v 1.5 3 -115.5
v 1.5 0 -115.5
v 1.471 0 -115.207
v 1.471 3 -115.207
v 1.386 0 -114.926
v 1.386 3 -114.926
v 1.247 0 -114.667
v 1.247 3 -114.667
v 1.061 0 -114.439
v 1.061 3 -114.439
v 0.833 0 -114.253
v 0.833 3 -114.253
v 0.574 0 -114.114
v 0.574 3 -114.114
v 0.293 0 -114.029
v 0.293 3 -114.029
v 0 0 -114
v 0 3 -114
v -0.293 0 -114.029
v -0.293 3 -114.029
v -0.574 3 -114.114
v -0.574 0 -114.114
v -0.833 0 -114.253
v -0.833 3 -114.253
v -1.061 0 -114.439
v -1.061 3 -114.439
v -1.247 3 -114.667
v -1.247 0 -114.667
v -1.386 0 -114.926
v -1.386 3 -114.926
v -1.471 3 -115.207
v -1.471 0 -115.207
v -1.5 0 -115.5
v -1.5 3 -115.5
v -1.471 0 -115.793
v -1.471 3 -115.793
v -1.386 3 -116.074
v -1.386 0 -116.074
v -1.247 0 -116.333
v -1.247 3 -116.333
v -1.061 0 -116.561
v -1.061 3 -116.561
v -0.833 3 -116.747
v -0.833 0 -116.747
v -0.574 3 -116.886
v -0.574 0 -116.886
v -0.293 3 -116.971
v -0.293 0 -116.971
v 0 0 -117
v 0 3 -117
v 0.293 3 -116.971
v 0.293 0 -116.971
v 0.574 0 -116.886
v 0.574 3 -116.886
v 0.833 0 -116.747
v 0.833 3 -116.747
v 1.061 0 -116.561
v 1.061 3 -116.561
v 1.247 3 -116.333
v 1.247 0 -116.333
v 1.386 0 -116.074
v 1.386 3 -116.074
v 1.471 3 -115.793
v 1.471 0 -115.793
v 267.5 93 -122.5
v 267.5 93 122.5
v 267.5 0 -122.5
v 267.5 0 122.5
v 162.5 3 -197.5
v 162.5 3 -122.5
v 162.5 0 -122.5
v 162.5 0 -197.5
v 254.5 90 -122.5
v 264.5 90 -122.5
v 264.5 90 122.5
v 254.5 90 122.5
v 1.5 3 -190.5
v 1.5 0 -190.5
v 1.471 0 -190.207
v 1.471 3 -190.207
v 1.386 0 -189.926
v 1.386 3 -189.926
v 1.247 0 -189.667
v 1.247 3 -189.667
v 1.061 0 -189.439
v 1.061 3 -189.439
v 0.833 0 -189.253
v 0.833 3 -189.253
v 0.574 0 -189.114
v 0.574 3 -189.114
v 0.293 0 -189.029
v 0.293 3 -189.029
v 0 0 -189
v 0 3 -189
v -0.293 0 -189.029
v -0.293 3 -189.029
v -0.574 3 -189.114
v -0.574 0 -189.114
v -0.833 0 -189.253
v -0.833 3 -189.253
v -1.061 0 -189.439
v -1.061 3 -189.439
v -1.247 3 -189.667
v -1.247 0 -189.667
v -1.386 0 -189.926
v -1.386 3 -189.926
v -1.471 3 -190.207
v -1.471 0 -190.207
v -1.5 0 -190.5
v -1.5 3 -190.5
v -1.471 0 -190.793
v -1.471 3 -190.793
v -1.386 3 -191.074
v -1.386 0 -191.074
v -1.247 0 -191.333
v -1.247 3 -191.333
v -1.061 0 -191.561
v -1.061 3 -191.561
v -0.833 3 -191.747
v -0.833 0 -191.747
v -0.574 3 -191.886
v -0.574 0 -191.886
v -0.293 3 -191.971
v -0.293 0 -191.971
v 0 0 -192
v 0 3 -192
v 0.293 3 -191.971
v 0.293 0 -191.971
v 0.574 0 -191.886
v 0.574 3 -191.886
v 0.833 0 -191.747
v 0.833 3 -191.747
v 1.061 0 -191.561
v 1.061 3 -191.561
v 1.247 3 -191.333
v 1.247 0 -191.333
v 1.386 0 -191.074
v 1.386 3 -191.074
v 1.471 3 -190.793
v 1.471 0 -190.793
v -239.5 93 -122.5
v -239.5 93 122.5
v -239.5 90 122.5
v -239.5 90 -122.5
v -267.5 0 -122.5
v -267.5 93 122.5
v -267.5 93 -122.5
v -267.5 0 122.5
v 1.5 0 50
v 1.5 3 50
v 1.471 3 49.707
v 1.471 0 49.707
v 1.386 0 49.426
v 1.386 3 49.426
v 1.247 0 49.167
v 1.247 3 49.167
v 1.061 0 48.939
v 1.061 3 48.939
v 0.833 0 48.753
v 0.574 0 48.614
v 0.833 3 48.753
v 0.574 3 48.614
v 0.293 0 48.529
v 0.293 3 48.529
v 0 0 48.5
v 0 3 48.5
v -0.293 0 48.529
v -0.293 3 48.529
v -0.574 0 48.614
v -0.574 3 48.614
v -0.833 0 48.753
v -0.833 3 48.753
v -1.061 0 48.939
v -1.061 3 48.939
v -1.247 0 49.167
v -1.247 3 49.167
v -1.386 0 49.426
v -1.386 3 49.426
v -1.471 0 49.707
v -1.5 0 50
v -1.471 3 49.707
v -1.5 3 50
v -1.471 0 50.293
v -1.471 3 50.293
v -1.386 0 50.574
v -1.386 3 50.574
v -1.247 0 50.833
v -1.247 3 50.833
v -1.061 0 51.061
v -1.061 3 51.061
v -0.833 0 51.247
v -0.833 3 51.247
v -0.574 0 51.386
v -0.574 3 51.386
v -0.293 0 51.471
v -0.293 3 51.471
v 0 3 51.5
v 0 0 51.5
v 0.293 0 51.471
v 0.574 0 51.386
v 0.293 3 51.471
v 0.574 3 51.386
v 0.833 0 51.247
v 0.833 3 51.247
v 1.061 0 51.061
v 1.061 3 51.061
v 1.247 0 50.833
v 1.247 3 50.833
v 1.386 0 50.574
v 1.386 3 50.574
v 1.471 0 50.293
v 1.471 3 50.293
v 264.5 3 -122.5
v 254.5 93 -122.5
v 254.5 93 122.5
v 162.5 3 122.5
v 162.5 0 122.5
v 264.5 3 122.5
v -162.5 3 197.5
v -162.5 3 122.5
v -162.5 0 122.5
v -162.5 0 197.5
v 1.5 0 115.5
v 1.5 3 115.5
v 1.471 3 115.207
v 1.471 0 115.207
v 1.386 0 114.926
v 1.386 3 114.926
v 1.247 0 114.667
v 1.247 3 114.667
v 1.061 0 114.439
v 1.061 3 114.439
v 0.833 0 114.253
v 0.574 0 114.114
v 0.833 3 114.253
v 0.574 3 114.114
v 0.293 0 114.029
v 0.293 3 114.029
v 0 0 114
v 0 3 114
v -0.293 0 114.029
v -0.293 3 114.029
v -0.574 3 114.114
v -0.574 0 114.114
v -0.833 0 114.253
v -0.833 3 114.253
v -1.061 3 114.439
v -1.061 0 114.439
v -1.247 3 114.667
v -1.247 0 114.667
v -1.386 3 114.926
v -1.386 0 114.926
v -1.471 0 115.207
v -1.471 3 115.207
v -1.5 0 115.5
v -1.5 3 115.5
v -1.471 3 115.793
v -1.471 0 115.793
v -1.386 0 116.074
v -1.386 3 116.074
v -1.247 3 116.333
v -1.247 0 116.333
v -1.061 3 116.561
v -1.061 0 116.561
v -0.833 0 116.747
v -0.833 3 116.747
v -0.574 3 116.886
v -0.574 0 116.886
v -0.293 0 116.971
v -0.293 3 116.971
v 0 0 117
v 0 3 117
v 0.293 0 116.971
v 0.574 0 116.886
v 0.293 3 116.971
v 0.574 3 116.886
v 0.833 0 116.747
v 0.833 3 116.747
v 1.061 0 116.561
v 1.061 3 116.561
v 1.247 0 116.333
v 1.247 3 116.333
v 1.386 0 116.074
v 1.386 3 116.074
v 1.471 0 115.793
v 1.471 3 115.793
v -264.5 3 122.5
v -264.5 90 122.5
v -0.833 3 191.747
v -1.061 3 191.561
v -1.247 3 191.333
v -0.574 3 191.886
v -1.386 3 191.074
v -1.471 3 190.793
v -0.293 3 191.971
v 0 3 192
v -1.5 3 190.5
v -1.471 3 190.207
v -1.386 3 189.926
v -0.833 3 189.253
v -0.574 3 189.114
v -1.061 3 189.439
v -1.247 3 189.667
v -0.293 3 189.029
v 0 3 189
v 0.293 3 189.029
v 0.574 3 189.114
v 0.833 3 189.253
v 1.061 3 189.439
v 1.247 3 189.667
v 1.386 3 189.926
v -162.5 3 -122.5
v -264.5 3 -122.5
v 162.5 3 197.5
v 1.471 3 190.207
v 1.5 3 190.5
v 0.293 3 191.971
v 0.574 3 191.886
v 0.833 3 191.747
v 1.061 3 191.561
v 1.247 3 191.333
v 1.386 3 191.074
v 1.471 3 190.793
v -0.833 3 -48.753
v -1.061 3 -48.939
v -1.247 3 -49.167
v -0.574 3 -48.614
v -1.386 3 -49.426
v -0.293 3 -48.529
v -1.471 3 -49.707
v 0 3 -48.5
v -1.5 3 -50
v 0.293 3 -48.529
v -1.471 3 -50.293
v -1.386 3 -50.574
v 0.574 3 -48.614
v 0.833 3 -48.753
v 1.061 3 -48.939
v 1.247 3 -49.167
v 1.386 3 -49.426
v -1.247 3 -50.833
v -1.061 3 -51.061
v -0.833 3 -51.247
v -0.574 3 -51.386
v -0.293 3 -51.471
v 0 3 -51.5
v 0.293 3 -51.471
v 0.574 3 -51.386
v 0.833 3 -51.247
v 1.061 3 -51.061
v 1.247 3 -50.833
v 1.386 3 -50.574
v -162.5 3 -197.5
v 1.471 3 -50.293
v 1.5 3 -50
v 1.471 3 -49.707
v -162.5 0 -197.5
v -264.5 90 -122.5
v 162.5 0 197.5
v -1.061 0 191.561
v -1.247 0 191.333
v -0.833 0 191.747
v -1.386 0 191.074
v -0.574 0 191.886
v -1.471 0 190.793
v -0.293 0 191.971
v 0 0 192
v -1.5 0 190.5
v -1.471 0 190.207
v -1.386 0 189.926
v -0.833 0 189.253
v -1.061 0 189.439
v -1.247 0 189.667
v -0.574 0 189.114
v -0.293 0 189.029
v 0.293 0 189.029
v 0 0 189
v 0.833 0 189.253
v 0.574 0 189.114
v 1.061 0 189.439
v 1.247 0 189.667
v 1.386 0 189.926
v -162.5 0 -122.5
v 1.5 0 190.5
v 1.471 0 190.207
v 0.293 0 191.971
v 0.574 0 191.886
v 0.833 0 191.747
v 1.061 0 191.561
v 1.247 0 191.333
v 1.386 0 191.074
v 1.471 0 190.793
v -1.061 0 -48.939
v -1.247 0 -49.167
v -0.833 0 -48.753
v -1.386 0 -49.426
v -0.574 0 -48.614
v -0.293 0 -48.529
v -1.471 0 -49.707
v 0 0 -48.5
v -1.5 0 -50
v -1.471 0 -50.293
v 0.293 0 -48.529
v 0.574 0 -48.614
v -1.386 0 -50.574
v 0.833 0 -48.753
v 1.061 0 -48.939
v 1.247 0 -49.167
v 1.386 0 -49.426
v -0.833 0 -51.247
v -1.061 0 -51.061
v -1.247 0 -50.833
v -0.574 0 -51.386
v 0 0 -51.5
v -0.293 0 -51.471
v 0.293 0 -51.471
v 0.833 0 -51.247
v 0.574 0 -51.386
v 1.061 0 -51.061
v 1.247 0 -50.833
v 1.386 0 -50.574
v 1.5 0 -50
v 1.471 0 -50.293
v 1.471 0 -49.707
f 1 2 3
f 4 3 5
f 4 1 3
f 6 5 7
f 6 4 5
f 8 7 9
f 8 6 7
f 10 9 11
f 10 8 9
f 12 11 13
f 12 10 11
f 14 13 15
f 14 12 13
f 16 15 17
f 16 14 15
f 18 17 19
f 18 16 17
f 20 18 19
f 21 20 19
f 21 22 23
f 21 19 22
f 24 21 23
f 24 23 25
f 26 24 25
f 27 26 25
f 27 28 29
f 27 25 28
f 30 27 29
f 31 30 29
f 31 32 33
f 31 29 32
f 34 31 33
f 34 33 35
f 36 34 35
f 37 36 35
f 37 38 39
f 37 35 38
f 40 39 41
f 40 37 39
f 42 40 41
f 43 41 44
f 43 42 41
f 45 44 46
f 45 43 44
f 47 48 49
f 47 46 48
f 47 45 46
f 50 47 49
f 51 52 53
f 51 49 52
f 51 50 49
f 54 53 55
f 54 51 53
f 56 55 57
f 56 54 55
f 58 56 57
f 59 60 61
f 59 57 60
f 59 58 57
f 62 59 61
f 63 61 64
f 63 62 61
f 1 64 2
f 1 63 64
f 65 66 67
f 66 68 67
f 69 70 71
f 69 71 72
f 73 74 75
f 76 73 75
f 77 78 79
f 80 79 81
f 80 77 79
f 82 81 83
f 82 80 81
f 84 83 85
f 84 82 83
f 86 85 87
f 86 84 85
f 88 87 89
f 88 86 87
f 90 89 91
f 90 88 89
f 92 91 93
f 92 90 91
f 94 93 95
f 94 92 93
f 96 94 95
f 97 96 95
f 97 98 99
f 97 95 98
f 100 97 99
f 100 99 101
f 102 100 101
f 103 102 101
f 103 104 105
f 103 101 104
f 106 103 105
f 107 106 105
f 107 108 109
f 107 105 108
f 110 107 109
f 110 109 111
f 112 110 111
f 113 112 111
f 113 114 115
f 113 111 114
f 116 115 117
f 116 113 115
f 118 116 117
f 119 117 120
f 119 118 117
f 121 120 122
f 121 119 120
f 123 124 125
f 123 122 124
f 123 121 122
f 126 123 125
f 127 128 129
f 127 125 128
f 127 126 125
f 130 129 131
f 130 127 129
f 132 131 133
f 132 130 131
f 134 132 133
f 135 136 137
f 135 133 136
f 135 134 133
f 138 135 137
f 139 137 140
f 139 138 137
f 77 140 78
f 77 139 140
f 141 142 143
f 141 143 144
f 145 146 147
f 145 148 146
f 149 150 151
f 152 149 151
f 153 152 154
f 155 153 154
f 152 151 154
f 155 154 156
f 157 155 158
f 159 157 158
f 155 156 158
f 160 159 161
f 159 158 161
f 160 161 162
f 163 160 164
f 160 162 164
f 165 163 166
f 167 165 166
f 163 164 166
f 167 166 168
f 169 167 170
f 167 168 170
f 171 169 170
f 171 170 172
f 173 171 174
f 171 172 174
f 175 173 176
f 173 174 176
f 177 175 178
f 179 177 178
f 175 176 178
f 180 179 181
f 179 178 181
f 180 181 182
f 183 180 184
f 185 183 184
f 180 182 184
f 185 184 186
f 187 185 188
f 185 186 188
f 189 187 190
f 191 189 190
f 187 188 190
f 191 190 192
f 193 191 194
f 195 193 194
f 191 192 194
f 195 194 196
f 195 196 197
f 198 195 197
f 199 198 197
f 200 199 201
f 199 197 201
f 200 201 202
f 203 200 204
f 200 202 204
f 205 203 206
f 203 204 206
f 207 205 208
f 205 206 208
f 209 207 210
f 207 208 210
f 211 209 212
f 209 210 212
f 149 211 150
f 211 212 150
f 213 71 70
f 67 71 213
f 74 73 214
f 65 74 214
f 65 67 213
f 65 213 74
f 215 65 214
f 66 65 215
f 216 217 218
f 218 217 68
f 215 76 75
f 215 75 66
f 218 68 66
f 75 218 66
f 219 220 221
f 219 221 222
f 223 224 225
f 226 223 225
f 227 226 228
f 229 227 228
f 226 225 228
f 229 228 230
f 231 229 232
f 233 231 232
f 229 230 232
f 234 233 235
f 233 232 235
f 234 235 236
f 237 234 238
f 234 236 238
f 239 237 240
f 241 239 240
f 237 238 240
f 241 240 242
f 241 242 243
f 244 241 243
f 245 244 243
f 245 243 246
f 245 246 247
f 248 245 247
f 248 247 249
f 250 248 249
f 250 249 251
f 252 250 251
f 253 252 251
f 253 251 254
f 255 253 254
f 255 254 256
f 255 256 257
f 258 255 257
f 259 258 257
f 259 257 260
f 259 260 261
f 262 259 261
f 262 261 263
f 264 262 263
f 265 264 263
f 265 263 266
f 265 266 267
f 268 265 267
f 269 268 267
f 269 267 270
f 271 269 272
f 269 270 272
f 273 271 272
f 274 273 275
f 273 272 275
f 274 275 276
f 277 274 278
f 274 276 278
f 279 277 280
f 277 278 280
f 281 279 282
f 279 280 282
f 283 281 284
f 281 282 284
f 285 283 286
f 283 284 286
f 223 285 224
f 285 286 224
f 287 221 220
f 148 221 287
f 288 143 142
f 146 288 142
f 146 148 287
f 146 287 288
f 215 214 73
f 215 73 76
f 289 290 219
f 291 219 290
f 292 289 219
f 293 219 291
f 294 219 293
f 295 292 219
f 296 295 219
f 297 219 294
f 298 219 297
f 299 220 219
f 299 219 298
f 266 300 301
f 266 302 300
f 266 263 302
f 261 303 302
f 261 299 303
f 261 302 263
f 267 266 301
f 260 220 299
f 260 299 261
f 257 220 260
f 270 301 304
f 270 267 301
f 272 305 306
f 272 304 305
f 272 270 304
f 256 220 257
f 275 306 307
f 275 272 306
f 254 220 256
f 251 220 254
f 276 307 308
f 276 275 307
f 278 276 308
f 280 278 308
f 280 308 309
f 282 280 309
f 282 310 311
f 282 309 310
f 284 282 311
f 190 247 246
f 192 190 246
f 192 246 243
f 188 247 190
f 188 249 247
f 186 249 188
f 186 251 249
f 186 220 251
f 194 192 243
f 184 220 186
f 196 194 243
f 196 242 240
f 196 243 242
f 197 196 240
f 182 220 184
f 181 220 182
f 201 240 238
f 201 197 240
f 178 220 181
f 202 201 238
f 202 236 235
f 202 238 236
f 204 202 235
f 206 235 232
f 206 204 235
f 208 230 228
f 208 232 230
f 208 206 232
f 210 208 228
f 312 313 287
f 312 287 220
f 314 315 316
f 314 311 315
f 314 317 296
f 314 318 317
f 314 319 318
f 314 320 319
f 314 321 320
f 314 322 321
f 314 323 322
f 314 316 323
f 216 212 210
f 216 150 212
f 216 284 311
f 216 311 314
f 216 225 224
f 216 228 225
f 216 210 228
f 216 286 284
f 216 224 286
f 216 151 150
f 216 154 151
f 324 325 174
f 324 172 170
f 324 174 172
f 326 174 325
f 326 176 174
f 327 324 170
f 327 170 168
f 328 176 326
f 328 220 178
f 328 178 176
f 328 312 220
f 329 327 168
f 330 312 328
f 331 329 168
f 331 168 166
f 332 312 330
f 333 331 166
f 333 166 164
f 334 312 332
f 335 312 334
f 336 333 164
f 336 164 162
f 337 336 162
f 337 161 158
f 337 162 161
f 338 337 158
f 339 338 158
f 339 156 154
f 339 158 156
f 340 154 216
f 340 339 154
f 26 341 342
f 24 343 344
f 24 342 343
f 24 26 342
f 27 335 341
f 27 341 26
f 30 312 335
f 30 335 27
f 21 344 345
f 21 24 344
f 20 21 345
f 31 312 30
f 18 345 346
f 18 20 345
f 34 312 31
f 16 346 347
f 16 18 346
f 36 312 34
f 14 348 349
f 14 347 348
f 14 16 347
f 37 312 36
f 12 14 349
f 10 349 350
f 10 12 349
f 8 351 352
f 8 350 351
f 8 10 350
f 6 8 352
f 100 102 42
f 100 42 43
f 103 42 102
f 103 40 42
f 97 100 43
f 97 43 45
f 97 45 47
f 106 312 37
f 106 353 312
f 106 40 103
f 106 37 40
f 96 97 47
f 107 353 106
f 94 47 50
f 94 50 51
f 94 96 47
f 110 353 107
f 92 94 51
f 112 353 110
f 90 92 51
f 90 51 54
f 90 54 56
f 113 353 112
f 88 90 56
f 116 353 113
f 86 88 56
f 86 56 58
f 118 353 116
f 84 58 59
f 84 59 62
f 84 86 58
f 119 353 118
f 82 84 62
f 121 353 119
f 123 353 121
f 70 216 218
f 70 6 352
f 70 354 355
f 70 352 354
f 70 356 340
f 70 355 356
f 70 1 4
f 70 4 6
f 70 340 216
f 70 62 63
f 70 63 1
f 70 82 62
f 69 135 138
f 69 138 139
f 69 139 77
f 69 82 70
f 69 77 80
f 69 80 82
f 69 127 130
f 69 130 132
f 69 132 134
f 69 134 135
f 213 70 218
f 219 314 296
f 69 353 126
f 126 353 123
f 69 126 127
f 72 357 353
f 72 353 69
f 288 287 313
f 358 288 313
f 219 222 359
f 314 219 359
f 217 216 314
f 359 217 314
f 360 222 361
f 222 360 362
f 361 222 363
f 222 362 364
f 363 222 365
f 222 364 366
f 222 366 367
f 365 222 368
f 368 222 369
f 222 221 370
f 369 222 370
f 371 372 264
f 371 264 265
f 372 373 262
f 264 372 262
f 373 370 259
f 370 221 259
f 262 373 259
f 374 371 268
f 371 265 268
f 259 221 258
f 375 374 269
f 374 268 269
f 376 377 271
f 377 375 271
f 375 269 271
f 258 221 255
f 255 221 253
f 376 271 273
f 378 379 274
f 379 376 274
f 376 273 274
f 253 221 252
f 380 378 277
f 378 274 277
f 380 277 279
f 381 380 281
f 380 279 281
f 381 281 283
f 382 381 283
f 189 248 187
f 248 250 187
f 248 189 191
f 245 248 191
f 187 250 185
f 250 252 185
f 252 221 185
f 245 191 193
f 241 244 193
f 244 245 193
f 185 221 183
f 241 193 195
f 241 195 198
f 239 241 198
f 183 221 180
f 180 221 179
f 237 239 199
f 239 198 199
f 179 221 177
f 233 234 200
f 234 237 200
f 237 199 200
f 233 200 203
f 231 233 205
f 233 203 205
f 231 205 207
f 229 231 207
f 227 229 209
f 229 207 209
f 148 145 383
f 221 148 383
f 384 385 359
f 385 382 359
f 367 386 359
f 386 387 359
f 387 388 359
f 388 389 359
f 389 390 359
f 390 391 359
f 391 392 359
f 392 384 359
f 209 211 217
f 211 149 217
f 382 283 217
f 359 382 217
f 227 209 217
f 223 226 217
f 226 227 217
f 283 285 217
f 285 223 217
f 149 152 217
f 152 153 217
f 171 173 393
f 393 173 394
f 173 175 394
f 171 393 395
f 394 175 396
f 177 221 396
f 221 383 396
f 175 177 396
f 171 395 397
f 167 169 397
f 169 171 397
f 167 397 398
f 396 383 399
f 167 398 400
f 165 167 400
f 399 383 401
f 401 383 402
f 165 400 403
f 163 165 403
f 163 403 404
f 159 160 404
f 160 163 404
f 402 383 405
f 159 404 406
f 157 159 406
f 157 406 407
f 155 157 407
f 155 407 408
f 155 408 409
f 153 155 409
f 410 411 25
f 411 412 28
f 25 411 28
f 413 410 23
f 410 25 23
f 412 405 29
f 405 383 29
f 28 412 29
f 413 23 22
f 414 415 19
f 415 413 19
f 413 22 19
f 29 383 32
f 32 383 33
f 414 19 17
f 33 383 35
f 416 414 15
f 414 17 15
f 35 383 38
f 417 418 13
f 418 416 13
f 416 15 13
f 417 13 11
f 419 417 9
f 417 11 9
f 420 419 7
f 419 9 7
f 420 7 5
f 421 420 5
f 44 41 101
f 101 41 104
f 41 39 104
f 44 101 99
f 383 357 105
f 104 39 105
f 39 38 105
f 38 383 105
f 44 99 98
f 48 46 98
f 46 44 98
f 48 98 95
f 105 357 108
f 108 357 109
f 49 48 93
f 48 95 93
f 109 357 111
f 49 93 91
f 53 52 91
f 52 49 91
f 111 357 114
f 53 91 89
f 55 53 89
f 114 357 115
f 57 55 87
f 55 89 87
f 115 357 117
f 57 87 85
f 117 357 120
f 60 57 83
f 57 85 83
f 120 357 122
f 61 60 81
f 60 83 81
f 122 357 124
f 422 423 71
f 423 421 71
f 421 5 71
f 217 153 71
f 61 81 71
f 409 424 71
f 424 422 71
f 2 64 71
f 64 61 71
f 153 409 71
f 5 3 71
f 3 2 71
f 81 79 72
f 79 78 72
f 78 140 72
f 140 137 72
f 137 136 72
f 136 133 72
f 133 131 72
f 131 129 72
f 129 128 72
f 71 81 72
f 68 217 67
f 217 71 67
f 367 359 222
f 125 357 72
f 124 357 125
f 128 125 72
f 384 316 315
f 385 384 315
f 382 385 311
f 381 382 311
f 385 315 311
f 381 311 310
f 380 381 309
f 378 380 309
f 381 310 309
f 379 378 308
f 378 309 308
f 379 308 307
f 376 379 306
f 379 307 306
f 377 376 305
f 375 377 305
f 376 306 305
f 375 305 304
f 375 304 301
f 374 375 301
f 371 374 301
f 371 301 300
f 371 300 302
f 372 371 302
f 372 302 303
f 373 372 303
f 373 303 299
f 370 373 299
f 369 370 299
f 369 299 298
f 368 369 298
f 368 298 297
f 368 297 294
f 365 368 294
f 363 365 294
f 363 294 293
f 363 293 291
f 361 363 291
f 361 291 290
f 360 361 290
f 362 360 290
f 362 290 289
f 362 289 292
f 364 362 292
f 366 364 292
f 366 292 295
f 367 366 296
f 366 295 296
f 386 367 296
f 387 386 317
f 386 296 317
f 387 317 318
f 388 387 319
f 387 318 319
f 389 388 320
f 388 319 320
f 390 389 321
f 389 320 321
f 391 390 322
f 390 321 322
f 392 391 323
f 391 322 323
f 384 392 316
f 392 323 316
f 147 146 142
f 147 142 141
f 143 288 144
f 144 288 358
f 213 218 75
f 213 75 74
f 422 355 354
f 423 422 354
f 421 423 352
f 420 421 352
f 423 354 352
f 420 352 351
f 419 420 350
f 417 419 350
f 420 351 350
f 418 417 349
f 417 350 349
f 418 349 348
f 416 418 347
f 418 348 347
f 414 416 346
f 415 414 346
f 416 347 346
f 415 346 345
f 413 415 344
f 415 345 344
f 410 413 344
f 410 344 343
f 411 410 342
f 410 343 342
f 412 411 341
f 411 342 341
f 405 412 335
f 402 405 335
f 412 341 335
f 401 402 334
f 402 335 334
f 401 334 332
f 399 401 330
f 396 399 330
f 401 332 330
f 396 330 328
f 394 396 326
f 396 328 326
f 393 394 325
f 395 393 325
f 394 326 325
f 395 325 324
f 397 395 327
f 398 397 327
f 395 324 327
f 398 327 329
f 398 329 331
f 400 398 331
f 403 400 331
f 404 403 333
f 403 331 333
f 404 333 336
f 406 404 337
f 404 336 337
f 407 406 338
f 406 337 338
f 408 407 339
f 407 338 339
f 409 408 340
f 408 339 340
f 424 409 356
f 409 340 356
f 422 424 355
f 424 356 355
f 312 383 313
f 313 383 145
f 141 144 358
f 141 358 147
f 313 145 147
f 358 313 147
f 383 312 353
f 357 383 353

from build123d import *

# Parameters (mm, degrees)
SKETCH1_W               = 535
SKETCH1_H               = 395
BOSS_EXTRUDE1_DEPTH     = 3
SKETCH2_W               = 105
SKETCH2_H               = 75
CUT_EXTRUDE1_DEPTH      = 3
MIRROR2_COPY_1_SKETCH_W = 105
MIRROR2_COPY_1_SKETCH_H = 75
MIRROR2_COPY_1_DEPTH    = 3
SKETCH3_W               = 3
SKETCH3_H               = 245
BOSS_EXTRUDE2_DEPTH     = 90
SKETCH4_W               = 245
SKETCH4_H               = 3
BOSS_EXTRUDE3_DEPTH     = 25
SKETCH5_W               = 3
SKETCH5_H               = 245
BOSS_EXTRUDE4_DEPTH     = 90
SKETCH6_W               = 245
SKETCH6_H               = 3
BOSS_EXTRUDE5_DEPTH     = 10
SKETCH7_R               = 1.5
CUT_EXTRUDE2_DEPTH      = 3
SKETCH8_R               = 1.5
CUT_EXTRUDE3_DEPTH      = 4
SKETCH9_R               = 1.5
CUT_EXTRUDE4_DEPTH      = 4


with BuildPart() as part:
    # Sketch1 → Boss-Extrude1 (new body)
    with BuildSketch(Plane(origin=(0, 0, 0), x_dir=(1, 0, 0), z_dir=(0, 1, 0))):
        Rectangle(SKETCH1_W, SKETCH1_H)
    extrude(amount=BOSS_EXTRUDE1_DEPTH)

    # Sketch2 → Cut-Extrude1 (cut)
    with BuildSketch(Plane(origin=(0, 3, 0), x_dir=(1, 0, 0), z_dir=(0, 1, 0))):
        with Locations((-215, 160)):
            Rectangle(SKETCH2_W, SKETCH2_H)
    cut_extrude1 = extrude(amount=-CUT_EXTRUDE1_DEPTH, mode=Mode.SUBTRACT)

    # Mirror1: Cut-Extrude1 across plane
    add(cut_extrude1.mirror(Plane.XY), mode=Mode.SUBTRACT)

    # Mirror2: Cut-Extrude1 across plane
    add(cut_extrude1.mirror(Plane(origin=(0, 0, 0), x_dir=(0, 0, 1), z_dir=(1, 0, 0))), mode=Mode.SUBTRACT)

    # Mirror2 copy 1 sketch → Mirror2 copy 1 (cut)
    with BuildSketch(Plane(origin=(0, 3, 0), x_dir=(-1, 0, 0), z_dir=(0, 1, 0))):
        with Locations((-215, 160)):
            Rectangle(MIRROR2_COPY_1_SKETCH_W, MIRROR2_COPY_1_SKETCH_H)
    extrude(amount=-MIRROR2_COPY_1_DEPTH, mode=Mode.SUBTRACT)

    # Sketch3 → Boss-Extrude2 (add)
    with BuildSketch(Plane(origin=(0, 3, 0), x_dir=(1, 0, 0), z_dir=(0, 1, 0))):
        with Locations((-266, 0)):
            Rectangle(SKETCH3_W, SKETCH3_H)
    extrude(amount=BOSS_EXTRUDE2_DEPTH)

    # Sketch4 → Boss-Extrude3 (add)
    with BuildSketch(Plane(origin=(-264.5, 0, 0), x_dir=(0, 0, -1), z_dir=(1, 0, 0))):
        with Locations((0, 91.5)):
            Rectangle(SKETCH4_W, SKETCH4_H)
    extrude(amount=BOSS_EXTRUDE3_DEPTH)

    # Sketch5 → Boss-Extrude4 (add)
    with BuildSketch(Plane(origin=(0, 3, 0), x_dir=(1, 0, 0), z_dir=(0, 1, 0))):
        with Locations((266, 0)):
            Rectangle(SKETCH5_W, SKETCH5_H)
    extrude(amount=BOSS_EXTRUDE4_DEPTH)

    # Sketch6 → Boss-Extrude5 (add)
    with BuildSketch(Plane.ZY.offset(-264.5)):
        with Locations((0, 91.5)):
            Rectangle(SKETCH6_W, SKETCH6_H)
    extrude(amount=BOSS_EXTRUDE5_DEPTH)

    # Sketch7 → Cut-Extrude2 (cut)
    with BuildSketch(Plane(origin=(0, 3, 0), x_dir=(1, 0, 0), z_dir=(0, 1, 0))):
        with Locations((0, 50)):
            Circle(SKETCH7_R)
        with Locations((0, -50)):
            Circle(SKETCH7_R)
    extrude(amount=-CUT_EXTRUDE2_DEPTH, mode=Mode.SUBTRACT)

    # Sketch8 → Cut-Extrude3 (cut, through all)
    with BuildSketch(Plane(origin=(0, 3, 0), x_dir=(1, 0, 0), z_dir=(0, 1, 0))):
        with Locations((0, -190.5)):
            Circle(SKETCH8_R)
    cut_extrude3 = extrude(amount=-CUT_EXTRUDE3_DEPTH, mode=Mode.SUBTRACT)

    # Sketch9 → Cut-Extrude4 (cut, through all)
    with BuildSketch(Plane(origin=(0, 3, 0), x_dir=(1, 0, 0), z_dir=(0, 1, 0))):
        with Locations((0, -115.5)):
            Circle(SKETCH9_R)
    cut_extrude4 = extrude(amount=-CUT_EXTRUDE4_DEPTH, mode=Mode.SUBTRACT)

    # Mirror3: Cut-Extrude3, Cut-Extrude4 across plane
    add(cut_extrude3.mirror(Plane.XY), mode=Mode.SUBTRACT)
    add(cut_extrude4.mirror(Plane.XY), mode=Mode.SUBTRACT)


solid = part.part
